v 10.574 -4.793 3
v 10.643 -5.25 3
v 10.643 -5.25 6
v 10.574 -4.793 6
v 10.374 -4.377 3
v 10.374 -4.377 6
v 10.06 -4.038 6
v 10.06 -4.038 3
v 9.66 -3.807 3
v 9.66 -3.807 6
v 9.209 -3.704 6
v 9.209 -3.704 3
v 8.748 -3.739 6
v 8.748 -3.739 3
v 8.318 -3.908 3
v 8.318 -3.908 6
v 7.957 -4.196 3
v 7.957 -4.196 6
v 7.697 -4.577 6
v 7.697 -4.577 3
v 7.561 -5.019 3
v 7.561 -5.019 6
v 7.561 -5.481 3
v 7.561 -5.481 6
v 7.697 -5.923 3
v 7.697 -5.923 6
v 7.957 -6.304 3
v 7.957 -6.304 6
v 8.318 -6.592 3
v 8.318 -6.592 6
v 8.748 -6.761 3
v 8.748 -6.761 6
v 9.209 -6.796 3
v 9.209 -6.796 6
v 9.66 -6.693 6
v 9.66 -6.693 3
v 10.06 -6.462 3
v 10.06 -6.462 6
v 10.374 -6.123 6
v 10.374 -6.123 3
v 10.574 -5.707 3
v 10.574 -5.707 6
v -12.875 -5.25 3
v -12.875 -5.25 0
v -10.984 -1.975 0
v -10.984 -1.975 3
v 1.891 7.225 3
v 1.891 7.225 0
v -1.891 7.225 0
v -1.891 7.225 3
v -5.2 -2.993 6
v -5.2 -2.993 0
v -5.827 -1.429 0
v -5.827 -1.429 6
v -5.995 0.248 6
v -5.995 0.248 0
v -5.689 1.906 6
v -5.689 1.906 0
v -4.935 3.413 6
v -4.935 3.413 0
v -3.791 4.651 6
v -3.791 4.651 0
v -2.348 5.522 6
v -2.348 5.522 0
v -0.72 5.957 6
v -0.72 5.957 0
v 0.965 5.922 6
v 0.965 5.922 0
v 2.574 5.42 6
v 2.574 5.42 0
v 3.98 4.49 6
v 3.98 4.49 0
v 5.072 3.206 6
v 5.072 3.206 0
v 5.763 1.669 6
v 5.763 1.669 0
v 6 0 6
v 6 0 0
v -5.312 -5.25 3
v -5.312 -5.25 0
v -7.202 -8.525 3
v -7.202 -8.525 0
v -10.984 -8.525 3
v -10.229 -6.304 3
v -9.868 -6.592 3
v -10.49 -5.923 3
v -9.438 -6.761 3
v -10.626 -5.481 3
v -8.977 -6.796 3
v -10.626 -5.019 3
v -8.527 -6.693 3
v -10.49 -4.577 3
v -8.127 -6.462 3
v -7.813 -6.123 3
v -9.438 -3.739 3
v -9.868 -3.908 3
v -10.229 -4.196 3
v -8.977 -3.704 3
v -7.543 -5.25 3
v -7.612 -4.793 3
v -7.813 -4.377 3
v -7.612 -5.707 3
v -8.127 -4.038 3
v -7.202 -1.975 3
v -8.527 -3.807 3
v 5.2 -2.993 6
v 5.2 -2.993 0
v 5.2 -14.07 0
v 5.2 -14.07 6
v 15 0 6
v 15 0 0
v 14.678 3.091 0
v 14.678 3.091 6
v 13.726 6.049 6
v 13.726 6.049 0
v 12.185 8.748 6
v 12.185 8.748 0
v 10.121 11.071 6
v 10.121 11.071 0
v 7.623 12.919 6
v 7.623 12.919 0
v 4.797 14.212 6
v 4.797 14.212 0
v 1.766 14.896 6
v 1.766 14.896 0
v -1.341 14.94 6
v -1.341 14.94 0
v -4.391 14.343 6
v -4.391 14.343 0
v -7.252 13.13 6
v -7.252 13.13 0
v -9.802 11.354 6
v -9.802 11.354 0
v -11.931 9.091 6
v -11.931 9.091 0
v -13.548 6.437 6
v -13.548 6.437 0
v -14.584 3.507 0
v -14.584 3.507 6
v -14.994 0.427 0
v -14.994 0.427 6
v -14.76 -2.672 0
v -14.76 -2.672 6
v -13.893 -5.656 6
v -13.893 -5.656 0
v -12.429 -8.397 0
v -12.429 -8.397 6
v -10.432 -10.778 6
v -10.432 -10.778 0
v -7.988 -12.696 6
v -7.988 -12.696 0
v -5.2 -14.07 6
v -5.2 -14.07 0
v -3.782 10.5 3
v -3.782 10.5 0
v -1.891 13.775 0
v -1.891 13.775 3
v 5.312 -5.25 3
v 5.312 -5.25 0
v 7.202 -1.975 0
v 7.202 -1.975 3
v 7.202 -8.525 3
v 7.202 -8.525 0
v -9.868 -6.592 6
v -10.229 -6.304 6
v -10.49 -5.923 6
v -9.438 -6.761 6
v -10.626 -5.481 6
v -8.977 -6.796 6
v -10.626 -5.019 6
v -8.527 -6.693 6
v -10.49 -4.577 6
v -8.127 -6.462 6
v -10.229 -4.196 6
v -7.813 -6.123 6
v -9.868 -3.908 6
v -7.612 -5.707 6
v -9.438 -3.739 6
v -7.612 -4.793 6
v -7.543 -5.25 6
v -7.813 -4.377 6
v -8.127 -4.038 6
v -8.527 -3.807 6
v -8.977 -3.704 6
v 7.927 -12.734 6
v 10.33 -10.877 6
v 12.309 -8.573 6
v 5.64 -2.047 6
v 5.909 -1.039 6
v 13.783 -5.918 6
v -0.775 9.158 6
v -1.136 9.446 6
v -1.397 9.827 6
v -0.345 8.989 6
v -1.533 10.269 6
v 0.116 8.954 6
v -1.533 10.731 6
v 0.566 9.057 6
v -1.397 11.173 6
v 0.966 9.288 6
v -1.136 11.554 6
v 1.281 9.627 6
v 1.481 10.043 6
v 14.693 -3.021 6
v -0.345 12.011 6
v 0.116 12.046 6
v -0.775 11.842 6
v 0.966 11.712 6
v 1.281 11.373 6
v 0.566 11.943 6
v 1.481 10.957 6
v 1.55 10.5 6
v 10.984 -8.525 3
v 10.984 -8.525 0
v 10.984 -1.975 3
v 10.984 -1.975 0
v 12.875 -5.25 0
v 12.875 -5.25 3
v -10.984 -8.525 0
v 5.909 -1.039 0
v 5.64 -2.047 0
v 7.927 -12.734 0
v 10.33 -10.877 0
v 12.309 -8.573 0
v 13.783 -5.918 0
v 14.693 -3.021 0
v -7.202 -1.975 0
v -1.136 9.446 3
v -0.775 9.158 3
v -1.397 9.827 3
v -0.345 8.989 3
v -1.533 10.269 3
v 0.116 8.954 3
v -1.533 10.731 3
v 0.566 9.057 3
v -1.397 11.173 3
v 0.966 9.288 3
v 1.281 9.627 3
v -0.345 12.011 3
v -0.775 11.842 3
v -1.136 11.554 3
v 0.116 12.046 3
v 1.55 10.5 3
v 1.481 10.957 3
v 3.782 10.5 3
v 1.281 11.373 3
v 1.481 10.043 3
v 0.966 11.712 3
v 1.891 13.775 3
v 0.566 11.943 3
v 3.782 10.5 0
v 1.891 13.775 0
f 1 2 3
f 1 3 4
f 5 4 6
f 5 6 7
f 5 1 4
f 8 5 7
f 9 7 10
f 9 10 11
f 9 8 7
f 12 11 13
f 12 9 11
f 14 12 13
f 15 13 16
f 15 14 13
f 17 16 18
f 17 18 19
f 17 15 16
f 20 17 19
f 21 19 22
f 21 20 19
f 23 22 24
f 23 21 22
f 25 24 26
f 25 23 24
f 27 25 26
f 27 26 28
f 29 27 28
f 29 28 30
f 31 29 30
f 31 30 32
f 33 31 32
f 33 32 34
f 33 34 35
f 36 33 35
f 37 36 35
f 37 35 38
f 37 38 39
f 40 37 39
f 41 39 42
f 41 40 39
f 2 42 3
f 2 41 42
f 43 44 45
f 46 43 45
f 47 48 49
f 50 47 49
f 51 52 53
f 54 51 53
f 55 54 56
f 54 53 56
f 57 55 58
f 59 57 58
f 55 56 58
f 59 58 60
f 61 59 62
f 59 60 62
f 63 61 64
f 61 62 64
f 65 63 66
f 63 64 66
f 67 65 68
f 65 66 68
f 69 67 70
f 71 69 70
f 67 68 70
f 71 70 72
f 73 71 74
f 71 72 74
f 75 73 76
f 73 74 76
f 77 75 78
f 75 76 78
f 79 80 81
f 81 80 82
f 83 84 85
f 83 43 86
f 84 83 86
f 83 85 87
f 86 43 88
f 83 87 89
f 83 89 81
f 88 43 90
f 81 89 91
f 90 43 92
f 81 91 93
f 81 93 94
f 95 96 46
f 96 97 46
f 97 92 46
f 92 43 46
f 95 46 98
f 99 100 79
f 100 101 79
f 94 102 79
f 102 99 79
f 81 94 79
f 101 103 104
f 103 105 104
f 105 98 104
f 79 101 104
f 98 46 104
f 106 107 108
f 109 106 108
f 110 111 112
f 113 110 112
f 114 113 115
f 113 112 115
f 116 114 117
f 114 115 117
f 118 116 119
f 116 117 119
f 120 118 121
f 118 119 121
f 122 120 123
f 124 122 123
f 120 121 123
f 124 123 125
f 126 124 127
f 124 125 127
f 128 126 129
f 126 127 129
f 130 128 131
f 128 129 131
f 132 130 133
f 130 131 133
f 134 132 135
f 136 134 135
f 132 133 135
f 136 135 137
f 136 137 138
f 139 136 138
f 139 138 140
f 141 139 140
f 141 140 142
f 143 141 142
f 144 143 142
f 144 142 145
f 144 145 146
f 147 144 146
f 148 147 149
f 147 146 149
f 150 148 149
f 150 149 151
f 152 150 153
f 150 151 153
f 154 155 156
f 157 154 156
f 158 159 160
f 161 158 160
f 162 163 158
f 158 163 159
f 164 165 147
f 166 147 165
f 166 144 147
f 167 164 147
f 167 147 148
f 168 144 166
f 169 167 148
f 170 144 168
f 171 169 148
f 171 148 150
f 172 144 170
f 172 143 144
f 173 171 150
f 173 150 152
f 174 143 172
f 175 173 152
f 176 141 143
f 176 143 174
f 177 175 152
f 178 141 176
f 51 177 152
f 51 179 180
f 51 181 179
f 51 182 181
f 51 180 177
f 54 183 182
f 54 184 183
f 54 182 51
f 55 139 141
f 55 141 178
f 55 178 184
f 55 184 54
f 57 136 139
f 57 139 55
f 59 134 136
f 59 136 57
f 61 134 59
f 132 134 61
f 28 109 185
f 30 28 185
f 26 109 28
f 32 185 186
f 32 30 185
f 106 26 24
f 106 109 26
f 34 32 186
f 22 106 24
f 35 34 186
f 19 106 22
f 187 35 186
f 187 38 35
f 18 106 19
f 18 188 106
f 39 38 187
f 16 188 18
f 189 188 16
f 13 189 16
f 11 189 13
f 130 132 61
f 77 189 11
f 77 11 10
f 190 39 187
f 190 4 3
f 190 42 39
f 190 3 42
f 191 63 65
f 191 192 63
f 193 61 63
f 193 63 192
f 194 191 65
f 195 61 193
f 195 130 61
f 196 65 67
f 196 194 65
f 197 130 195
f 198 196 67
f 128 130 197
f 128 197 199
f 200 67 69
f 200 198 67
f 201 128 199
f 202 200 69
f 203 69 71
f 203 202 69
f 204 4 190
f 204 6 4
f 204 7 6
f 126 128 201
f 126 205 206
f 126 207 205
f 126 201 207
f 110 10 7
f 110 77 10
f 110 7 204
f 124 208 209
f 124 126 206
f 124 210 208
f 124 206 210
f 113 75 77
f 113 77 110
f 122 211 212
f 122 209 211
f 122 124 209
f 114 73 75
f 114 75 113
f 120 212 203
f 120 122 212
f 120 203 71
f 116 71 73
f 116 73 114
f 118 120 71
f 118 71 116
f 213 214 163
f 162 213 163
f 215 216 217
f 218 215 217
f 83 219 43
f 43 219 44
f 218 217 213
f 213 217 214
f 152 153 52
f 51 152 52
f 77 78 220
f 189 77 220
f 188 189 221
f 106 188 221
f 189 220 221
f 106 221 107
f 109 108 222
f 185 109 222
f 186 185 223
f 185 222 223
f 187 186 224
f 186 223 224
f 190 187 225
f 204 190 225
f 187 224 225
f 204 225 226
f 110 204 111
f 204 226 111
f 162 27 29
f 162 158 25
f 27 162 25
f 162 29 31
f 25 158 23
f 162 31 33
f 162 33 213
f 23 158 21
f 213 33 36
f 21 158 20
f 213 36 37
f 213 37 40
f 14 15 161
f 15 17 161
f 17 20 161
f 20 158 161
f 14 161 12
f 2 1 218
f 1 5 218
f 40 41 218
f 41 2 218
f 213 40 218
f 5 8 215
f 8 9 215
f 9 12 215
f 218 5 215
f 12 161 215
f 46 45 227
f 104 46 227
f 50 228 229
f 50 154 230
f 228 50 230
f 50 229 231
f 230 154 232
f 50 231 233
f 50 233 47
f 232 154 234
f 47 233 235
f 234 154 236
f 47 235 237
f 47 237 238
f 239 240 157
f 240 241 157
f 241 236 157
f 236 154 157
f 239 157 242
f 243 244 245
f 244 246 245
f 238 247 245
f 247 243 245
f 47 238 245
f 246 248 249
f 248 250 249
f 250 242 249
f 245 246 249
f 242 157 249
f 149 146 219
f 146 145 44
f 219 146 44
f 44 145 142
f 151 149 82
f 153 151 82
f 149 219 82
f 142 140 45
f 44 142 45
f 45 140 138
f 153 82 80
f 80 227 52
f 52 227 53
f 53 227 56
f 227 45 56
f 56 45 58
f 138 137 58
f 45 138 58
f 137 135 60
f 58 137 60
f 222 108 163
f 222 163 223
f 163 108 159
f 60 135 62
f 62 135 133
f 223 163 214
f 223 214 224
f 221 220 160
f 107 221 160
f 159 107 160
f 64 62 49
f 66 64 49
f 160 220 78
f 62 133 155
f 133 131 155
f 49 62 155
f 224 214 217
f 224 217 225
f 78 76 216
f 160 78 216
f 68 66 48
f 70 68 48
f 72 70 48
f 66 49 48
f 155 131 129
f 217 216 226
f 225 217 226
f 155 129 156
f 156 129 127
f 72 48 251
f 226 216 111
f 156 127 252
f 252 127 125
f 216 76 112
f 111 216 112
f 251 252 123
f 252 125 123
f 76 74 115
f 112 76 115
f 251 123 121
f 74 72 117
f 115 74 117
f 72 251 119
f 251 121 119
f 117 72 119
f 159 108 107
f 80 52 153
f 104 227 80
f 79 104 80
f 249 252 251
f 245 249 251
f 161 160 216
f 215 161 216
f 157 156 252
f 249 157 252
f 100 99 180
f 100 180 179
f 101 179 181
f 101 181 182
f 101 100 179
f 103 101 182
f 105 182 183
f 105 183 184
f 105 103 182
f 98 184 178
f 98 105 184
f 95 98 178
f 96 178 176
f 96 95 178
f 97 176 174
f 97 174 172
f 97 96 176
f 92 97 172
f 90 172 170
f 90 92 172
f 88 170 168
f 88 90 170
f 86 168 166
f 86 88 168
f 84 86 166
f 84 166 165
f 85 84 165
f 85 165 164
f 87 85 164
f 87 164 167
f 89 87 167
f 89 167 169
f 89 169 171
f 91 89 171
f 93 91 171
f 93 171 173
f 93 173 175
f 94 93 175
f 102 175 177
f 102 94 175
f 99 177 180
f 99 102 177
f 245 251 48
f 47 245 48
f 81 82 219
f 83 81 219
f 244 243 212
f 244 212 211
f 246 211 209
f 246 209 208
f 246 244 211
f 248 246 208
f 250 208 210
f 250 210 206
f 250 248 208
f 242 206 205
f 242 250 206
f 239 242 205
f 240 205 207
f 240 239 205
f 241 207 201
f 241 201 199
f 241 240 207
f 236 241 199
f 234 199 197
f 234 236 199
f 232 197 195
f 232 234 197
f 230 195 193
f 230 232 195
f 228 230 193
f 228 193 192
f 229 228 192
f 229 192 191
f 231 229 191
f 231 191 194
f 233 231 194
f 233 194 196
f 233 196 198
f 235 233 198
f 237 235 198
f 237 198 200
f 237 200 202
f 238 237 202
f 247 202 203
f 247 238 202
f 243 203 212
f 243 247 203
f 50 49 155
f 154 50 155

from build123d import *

# Parameters (mm, degrees)
F1_DEPTH = 6
F2_START = 3
F0_R     = 1.55
F2_DEPTH = 3


with BuildPart() as f1:
    # F0 (on Top) → F1 (new body)
    with BuildSketch(Plane.XY):
        with BuildLine():
            ThreePointArc((-5.2, -2.9933259094), (-1.5491933385, 5.7965506985), (6, 0))
            ThreePointArc((6, 0), (5.7965506985, -1.5491933385), (5.2, -2.9933259094))
            Line((5.2, -2.9933259094), (5.2, -14.0698258696))
            ThreePointArc((5.2, -14.0698258696), (12.3085336251, -8.5732140997), (15, 0))
            ThreePointArc((15, 0), (-8.5732140997, 12.3085336251), (-5.2, -14.0698258696))
            Line((-5.2, -14.0698258696), (-5.2, -2.9933259094))
        make_face()
        Polygon((-10.9840888713, -8.525), (-12.8749110029, -5.25), (-10.9840888713, -1.975), (-7.2024446081, -1.975), (-5.3116224765, -5.25), (-7.2024446081, -8.525), align=None, mode=Mode.SUBTRACT)
        Polygon((12.8749110029, -5.25), (10.9840888713, -8.525), (7.2024446081, -8.525), (5.3116224765, -5.25), (7.2024446081, -1.975), (10.9840888713, -1.975), align=None, mode=Mode.SUBTRACT)
        Polygon((3.7816442632, 10.5), (1.8908221316, 7.225), (-1.8908221316, 7.225), (-3.7816442632, 10.5), (-1.8908221316, 13.775), (1.8908221316, 13.775), align=None, mode=Mode.SUBTRACT)
    extrude(amount=F1_DEPTH)

    # F0 (on Top) → F2 (join)
    with BuildSketch(Plane.XY.offset(F2_START)):
        Polygon((7.2024446081, -8.525), (10.9840888713, -8.525), (12.8749110029, -5.25), (10.9840888713, -1.975), (7.2024446081, -1.975), (5.3116224765, -5.25), align=None)
        with Locations((9.0932667397, -5.25)):
            Circle(F0_R, mode=Mode.SUBTRACT)
        Polygon((-1.8908221316, 7.225), (1.8908221316, 7.225), (3.7816442632, 10.5), (1.8908221316, 13.775), (-1.8908221316, 13.775), (-3.7816442632, 10.5), align=None)
        with Locations((0, 10.5)):
            Circle(F0_R, mode=Mode.SUBTRACT)
        Polygon((-10.9840888713, -1.975), (-12.8749110029, -5.25), (-10.9840888713, -8.525), (-7.2024446081, -8.525), (-5.3116224765, -5.25), (-7.2024446081, -1.975), align=None)
        with Locations((-9.0932667397, -5.25)):
            Circle(F0_R, mode=Mode.SUBTRACT)
    extrude(amount=F2_DEPTH)


solid = f1.part
